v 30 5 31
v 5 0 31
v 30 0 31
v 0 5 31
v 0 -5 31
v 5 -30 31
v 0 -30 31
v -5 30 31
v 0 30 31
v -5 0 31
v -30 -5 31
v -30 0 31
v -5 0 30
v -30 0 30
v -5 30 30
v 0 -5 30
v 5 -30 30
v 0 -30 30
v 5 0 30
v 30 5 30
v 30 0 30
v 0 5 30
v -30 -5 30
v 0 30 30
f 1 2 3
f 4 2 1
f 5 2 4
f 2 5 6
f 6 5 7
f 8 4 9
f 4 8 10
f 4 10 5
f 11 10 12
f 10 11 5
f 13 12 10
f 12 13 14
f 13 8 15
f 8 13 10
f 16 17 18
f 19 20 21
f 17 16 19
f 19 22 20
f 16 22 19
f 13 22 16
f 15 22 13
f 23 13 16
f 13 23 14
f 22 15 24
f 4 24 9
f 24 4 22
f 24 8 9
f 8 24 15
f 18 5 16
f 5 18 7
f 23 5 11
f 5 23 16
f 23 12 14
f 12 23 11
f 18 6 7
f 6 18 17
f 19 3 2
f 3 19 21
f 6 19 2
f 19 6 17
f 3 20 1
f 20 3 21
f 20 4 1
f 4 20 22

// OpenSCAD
end = 4;
step = 1;
module myshape(){
    
    for (i = [1:step:end]){
        rotate([0,0,360/end*i])
        cube([30,5,1]);
        
        }
    }
    
translate([0,0,30])
    myshape();
    
